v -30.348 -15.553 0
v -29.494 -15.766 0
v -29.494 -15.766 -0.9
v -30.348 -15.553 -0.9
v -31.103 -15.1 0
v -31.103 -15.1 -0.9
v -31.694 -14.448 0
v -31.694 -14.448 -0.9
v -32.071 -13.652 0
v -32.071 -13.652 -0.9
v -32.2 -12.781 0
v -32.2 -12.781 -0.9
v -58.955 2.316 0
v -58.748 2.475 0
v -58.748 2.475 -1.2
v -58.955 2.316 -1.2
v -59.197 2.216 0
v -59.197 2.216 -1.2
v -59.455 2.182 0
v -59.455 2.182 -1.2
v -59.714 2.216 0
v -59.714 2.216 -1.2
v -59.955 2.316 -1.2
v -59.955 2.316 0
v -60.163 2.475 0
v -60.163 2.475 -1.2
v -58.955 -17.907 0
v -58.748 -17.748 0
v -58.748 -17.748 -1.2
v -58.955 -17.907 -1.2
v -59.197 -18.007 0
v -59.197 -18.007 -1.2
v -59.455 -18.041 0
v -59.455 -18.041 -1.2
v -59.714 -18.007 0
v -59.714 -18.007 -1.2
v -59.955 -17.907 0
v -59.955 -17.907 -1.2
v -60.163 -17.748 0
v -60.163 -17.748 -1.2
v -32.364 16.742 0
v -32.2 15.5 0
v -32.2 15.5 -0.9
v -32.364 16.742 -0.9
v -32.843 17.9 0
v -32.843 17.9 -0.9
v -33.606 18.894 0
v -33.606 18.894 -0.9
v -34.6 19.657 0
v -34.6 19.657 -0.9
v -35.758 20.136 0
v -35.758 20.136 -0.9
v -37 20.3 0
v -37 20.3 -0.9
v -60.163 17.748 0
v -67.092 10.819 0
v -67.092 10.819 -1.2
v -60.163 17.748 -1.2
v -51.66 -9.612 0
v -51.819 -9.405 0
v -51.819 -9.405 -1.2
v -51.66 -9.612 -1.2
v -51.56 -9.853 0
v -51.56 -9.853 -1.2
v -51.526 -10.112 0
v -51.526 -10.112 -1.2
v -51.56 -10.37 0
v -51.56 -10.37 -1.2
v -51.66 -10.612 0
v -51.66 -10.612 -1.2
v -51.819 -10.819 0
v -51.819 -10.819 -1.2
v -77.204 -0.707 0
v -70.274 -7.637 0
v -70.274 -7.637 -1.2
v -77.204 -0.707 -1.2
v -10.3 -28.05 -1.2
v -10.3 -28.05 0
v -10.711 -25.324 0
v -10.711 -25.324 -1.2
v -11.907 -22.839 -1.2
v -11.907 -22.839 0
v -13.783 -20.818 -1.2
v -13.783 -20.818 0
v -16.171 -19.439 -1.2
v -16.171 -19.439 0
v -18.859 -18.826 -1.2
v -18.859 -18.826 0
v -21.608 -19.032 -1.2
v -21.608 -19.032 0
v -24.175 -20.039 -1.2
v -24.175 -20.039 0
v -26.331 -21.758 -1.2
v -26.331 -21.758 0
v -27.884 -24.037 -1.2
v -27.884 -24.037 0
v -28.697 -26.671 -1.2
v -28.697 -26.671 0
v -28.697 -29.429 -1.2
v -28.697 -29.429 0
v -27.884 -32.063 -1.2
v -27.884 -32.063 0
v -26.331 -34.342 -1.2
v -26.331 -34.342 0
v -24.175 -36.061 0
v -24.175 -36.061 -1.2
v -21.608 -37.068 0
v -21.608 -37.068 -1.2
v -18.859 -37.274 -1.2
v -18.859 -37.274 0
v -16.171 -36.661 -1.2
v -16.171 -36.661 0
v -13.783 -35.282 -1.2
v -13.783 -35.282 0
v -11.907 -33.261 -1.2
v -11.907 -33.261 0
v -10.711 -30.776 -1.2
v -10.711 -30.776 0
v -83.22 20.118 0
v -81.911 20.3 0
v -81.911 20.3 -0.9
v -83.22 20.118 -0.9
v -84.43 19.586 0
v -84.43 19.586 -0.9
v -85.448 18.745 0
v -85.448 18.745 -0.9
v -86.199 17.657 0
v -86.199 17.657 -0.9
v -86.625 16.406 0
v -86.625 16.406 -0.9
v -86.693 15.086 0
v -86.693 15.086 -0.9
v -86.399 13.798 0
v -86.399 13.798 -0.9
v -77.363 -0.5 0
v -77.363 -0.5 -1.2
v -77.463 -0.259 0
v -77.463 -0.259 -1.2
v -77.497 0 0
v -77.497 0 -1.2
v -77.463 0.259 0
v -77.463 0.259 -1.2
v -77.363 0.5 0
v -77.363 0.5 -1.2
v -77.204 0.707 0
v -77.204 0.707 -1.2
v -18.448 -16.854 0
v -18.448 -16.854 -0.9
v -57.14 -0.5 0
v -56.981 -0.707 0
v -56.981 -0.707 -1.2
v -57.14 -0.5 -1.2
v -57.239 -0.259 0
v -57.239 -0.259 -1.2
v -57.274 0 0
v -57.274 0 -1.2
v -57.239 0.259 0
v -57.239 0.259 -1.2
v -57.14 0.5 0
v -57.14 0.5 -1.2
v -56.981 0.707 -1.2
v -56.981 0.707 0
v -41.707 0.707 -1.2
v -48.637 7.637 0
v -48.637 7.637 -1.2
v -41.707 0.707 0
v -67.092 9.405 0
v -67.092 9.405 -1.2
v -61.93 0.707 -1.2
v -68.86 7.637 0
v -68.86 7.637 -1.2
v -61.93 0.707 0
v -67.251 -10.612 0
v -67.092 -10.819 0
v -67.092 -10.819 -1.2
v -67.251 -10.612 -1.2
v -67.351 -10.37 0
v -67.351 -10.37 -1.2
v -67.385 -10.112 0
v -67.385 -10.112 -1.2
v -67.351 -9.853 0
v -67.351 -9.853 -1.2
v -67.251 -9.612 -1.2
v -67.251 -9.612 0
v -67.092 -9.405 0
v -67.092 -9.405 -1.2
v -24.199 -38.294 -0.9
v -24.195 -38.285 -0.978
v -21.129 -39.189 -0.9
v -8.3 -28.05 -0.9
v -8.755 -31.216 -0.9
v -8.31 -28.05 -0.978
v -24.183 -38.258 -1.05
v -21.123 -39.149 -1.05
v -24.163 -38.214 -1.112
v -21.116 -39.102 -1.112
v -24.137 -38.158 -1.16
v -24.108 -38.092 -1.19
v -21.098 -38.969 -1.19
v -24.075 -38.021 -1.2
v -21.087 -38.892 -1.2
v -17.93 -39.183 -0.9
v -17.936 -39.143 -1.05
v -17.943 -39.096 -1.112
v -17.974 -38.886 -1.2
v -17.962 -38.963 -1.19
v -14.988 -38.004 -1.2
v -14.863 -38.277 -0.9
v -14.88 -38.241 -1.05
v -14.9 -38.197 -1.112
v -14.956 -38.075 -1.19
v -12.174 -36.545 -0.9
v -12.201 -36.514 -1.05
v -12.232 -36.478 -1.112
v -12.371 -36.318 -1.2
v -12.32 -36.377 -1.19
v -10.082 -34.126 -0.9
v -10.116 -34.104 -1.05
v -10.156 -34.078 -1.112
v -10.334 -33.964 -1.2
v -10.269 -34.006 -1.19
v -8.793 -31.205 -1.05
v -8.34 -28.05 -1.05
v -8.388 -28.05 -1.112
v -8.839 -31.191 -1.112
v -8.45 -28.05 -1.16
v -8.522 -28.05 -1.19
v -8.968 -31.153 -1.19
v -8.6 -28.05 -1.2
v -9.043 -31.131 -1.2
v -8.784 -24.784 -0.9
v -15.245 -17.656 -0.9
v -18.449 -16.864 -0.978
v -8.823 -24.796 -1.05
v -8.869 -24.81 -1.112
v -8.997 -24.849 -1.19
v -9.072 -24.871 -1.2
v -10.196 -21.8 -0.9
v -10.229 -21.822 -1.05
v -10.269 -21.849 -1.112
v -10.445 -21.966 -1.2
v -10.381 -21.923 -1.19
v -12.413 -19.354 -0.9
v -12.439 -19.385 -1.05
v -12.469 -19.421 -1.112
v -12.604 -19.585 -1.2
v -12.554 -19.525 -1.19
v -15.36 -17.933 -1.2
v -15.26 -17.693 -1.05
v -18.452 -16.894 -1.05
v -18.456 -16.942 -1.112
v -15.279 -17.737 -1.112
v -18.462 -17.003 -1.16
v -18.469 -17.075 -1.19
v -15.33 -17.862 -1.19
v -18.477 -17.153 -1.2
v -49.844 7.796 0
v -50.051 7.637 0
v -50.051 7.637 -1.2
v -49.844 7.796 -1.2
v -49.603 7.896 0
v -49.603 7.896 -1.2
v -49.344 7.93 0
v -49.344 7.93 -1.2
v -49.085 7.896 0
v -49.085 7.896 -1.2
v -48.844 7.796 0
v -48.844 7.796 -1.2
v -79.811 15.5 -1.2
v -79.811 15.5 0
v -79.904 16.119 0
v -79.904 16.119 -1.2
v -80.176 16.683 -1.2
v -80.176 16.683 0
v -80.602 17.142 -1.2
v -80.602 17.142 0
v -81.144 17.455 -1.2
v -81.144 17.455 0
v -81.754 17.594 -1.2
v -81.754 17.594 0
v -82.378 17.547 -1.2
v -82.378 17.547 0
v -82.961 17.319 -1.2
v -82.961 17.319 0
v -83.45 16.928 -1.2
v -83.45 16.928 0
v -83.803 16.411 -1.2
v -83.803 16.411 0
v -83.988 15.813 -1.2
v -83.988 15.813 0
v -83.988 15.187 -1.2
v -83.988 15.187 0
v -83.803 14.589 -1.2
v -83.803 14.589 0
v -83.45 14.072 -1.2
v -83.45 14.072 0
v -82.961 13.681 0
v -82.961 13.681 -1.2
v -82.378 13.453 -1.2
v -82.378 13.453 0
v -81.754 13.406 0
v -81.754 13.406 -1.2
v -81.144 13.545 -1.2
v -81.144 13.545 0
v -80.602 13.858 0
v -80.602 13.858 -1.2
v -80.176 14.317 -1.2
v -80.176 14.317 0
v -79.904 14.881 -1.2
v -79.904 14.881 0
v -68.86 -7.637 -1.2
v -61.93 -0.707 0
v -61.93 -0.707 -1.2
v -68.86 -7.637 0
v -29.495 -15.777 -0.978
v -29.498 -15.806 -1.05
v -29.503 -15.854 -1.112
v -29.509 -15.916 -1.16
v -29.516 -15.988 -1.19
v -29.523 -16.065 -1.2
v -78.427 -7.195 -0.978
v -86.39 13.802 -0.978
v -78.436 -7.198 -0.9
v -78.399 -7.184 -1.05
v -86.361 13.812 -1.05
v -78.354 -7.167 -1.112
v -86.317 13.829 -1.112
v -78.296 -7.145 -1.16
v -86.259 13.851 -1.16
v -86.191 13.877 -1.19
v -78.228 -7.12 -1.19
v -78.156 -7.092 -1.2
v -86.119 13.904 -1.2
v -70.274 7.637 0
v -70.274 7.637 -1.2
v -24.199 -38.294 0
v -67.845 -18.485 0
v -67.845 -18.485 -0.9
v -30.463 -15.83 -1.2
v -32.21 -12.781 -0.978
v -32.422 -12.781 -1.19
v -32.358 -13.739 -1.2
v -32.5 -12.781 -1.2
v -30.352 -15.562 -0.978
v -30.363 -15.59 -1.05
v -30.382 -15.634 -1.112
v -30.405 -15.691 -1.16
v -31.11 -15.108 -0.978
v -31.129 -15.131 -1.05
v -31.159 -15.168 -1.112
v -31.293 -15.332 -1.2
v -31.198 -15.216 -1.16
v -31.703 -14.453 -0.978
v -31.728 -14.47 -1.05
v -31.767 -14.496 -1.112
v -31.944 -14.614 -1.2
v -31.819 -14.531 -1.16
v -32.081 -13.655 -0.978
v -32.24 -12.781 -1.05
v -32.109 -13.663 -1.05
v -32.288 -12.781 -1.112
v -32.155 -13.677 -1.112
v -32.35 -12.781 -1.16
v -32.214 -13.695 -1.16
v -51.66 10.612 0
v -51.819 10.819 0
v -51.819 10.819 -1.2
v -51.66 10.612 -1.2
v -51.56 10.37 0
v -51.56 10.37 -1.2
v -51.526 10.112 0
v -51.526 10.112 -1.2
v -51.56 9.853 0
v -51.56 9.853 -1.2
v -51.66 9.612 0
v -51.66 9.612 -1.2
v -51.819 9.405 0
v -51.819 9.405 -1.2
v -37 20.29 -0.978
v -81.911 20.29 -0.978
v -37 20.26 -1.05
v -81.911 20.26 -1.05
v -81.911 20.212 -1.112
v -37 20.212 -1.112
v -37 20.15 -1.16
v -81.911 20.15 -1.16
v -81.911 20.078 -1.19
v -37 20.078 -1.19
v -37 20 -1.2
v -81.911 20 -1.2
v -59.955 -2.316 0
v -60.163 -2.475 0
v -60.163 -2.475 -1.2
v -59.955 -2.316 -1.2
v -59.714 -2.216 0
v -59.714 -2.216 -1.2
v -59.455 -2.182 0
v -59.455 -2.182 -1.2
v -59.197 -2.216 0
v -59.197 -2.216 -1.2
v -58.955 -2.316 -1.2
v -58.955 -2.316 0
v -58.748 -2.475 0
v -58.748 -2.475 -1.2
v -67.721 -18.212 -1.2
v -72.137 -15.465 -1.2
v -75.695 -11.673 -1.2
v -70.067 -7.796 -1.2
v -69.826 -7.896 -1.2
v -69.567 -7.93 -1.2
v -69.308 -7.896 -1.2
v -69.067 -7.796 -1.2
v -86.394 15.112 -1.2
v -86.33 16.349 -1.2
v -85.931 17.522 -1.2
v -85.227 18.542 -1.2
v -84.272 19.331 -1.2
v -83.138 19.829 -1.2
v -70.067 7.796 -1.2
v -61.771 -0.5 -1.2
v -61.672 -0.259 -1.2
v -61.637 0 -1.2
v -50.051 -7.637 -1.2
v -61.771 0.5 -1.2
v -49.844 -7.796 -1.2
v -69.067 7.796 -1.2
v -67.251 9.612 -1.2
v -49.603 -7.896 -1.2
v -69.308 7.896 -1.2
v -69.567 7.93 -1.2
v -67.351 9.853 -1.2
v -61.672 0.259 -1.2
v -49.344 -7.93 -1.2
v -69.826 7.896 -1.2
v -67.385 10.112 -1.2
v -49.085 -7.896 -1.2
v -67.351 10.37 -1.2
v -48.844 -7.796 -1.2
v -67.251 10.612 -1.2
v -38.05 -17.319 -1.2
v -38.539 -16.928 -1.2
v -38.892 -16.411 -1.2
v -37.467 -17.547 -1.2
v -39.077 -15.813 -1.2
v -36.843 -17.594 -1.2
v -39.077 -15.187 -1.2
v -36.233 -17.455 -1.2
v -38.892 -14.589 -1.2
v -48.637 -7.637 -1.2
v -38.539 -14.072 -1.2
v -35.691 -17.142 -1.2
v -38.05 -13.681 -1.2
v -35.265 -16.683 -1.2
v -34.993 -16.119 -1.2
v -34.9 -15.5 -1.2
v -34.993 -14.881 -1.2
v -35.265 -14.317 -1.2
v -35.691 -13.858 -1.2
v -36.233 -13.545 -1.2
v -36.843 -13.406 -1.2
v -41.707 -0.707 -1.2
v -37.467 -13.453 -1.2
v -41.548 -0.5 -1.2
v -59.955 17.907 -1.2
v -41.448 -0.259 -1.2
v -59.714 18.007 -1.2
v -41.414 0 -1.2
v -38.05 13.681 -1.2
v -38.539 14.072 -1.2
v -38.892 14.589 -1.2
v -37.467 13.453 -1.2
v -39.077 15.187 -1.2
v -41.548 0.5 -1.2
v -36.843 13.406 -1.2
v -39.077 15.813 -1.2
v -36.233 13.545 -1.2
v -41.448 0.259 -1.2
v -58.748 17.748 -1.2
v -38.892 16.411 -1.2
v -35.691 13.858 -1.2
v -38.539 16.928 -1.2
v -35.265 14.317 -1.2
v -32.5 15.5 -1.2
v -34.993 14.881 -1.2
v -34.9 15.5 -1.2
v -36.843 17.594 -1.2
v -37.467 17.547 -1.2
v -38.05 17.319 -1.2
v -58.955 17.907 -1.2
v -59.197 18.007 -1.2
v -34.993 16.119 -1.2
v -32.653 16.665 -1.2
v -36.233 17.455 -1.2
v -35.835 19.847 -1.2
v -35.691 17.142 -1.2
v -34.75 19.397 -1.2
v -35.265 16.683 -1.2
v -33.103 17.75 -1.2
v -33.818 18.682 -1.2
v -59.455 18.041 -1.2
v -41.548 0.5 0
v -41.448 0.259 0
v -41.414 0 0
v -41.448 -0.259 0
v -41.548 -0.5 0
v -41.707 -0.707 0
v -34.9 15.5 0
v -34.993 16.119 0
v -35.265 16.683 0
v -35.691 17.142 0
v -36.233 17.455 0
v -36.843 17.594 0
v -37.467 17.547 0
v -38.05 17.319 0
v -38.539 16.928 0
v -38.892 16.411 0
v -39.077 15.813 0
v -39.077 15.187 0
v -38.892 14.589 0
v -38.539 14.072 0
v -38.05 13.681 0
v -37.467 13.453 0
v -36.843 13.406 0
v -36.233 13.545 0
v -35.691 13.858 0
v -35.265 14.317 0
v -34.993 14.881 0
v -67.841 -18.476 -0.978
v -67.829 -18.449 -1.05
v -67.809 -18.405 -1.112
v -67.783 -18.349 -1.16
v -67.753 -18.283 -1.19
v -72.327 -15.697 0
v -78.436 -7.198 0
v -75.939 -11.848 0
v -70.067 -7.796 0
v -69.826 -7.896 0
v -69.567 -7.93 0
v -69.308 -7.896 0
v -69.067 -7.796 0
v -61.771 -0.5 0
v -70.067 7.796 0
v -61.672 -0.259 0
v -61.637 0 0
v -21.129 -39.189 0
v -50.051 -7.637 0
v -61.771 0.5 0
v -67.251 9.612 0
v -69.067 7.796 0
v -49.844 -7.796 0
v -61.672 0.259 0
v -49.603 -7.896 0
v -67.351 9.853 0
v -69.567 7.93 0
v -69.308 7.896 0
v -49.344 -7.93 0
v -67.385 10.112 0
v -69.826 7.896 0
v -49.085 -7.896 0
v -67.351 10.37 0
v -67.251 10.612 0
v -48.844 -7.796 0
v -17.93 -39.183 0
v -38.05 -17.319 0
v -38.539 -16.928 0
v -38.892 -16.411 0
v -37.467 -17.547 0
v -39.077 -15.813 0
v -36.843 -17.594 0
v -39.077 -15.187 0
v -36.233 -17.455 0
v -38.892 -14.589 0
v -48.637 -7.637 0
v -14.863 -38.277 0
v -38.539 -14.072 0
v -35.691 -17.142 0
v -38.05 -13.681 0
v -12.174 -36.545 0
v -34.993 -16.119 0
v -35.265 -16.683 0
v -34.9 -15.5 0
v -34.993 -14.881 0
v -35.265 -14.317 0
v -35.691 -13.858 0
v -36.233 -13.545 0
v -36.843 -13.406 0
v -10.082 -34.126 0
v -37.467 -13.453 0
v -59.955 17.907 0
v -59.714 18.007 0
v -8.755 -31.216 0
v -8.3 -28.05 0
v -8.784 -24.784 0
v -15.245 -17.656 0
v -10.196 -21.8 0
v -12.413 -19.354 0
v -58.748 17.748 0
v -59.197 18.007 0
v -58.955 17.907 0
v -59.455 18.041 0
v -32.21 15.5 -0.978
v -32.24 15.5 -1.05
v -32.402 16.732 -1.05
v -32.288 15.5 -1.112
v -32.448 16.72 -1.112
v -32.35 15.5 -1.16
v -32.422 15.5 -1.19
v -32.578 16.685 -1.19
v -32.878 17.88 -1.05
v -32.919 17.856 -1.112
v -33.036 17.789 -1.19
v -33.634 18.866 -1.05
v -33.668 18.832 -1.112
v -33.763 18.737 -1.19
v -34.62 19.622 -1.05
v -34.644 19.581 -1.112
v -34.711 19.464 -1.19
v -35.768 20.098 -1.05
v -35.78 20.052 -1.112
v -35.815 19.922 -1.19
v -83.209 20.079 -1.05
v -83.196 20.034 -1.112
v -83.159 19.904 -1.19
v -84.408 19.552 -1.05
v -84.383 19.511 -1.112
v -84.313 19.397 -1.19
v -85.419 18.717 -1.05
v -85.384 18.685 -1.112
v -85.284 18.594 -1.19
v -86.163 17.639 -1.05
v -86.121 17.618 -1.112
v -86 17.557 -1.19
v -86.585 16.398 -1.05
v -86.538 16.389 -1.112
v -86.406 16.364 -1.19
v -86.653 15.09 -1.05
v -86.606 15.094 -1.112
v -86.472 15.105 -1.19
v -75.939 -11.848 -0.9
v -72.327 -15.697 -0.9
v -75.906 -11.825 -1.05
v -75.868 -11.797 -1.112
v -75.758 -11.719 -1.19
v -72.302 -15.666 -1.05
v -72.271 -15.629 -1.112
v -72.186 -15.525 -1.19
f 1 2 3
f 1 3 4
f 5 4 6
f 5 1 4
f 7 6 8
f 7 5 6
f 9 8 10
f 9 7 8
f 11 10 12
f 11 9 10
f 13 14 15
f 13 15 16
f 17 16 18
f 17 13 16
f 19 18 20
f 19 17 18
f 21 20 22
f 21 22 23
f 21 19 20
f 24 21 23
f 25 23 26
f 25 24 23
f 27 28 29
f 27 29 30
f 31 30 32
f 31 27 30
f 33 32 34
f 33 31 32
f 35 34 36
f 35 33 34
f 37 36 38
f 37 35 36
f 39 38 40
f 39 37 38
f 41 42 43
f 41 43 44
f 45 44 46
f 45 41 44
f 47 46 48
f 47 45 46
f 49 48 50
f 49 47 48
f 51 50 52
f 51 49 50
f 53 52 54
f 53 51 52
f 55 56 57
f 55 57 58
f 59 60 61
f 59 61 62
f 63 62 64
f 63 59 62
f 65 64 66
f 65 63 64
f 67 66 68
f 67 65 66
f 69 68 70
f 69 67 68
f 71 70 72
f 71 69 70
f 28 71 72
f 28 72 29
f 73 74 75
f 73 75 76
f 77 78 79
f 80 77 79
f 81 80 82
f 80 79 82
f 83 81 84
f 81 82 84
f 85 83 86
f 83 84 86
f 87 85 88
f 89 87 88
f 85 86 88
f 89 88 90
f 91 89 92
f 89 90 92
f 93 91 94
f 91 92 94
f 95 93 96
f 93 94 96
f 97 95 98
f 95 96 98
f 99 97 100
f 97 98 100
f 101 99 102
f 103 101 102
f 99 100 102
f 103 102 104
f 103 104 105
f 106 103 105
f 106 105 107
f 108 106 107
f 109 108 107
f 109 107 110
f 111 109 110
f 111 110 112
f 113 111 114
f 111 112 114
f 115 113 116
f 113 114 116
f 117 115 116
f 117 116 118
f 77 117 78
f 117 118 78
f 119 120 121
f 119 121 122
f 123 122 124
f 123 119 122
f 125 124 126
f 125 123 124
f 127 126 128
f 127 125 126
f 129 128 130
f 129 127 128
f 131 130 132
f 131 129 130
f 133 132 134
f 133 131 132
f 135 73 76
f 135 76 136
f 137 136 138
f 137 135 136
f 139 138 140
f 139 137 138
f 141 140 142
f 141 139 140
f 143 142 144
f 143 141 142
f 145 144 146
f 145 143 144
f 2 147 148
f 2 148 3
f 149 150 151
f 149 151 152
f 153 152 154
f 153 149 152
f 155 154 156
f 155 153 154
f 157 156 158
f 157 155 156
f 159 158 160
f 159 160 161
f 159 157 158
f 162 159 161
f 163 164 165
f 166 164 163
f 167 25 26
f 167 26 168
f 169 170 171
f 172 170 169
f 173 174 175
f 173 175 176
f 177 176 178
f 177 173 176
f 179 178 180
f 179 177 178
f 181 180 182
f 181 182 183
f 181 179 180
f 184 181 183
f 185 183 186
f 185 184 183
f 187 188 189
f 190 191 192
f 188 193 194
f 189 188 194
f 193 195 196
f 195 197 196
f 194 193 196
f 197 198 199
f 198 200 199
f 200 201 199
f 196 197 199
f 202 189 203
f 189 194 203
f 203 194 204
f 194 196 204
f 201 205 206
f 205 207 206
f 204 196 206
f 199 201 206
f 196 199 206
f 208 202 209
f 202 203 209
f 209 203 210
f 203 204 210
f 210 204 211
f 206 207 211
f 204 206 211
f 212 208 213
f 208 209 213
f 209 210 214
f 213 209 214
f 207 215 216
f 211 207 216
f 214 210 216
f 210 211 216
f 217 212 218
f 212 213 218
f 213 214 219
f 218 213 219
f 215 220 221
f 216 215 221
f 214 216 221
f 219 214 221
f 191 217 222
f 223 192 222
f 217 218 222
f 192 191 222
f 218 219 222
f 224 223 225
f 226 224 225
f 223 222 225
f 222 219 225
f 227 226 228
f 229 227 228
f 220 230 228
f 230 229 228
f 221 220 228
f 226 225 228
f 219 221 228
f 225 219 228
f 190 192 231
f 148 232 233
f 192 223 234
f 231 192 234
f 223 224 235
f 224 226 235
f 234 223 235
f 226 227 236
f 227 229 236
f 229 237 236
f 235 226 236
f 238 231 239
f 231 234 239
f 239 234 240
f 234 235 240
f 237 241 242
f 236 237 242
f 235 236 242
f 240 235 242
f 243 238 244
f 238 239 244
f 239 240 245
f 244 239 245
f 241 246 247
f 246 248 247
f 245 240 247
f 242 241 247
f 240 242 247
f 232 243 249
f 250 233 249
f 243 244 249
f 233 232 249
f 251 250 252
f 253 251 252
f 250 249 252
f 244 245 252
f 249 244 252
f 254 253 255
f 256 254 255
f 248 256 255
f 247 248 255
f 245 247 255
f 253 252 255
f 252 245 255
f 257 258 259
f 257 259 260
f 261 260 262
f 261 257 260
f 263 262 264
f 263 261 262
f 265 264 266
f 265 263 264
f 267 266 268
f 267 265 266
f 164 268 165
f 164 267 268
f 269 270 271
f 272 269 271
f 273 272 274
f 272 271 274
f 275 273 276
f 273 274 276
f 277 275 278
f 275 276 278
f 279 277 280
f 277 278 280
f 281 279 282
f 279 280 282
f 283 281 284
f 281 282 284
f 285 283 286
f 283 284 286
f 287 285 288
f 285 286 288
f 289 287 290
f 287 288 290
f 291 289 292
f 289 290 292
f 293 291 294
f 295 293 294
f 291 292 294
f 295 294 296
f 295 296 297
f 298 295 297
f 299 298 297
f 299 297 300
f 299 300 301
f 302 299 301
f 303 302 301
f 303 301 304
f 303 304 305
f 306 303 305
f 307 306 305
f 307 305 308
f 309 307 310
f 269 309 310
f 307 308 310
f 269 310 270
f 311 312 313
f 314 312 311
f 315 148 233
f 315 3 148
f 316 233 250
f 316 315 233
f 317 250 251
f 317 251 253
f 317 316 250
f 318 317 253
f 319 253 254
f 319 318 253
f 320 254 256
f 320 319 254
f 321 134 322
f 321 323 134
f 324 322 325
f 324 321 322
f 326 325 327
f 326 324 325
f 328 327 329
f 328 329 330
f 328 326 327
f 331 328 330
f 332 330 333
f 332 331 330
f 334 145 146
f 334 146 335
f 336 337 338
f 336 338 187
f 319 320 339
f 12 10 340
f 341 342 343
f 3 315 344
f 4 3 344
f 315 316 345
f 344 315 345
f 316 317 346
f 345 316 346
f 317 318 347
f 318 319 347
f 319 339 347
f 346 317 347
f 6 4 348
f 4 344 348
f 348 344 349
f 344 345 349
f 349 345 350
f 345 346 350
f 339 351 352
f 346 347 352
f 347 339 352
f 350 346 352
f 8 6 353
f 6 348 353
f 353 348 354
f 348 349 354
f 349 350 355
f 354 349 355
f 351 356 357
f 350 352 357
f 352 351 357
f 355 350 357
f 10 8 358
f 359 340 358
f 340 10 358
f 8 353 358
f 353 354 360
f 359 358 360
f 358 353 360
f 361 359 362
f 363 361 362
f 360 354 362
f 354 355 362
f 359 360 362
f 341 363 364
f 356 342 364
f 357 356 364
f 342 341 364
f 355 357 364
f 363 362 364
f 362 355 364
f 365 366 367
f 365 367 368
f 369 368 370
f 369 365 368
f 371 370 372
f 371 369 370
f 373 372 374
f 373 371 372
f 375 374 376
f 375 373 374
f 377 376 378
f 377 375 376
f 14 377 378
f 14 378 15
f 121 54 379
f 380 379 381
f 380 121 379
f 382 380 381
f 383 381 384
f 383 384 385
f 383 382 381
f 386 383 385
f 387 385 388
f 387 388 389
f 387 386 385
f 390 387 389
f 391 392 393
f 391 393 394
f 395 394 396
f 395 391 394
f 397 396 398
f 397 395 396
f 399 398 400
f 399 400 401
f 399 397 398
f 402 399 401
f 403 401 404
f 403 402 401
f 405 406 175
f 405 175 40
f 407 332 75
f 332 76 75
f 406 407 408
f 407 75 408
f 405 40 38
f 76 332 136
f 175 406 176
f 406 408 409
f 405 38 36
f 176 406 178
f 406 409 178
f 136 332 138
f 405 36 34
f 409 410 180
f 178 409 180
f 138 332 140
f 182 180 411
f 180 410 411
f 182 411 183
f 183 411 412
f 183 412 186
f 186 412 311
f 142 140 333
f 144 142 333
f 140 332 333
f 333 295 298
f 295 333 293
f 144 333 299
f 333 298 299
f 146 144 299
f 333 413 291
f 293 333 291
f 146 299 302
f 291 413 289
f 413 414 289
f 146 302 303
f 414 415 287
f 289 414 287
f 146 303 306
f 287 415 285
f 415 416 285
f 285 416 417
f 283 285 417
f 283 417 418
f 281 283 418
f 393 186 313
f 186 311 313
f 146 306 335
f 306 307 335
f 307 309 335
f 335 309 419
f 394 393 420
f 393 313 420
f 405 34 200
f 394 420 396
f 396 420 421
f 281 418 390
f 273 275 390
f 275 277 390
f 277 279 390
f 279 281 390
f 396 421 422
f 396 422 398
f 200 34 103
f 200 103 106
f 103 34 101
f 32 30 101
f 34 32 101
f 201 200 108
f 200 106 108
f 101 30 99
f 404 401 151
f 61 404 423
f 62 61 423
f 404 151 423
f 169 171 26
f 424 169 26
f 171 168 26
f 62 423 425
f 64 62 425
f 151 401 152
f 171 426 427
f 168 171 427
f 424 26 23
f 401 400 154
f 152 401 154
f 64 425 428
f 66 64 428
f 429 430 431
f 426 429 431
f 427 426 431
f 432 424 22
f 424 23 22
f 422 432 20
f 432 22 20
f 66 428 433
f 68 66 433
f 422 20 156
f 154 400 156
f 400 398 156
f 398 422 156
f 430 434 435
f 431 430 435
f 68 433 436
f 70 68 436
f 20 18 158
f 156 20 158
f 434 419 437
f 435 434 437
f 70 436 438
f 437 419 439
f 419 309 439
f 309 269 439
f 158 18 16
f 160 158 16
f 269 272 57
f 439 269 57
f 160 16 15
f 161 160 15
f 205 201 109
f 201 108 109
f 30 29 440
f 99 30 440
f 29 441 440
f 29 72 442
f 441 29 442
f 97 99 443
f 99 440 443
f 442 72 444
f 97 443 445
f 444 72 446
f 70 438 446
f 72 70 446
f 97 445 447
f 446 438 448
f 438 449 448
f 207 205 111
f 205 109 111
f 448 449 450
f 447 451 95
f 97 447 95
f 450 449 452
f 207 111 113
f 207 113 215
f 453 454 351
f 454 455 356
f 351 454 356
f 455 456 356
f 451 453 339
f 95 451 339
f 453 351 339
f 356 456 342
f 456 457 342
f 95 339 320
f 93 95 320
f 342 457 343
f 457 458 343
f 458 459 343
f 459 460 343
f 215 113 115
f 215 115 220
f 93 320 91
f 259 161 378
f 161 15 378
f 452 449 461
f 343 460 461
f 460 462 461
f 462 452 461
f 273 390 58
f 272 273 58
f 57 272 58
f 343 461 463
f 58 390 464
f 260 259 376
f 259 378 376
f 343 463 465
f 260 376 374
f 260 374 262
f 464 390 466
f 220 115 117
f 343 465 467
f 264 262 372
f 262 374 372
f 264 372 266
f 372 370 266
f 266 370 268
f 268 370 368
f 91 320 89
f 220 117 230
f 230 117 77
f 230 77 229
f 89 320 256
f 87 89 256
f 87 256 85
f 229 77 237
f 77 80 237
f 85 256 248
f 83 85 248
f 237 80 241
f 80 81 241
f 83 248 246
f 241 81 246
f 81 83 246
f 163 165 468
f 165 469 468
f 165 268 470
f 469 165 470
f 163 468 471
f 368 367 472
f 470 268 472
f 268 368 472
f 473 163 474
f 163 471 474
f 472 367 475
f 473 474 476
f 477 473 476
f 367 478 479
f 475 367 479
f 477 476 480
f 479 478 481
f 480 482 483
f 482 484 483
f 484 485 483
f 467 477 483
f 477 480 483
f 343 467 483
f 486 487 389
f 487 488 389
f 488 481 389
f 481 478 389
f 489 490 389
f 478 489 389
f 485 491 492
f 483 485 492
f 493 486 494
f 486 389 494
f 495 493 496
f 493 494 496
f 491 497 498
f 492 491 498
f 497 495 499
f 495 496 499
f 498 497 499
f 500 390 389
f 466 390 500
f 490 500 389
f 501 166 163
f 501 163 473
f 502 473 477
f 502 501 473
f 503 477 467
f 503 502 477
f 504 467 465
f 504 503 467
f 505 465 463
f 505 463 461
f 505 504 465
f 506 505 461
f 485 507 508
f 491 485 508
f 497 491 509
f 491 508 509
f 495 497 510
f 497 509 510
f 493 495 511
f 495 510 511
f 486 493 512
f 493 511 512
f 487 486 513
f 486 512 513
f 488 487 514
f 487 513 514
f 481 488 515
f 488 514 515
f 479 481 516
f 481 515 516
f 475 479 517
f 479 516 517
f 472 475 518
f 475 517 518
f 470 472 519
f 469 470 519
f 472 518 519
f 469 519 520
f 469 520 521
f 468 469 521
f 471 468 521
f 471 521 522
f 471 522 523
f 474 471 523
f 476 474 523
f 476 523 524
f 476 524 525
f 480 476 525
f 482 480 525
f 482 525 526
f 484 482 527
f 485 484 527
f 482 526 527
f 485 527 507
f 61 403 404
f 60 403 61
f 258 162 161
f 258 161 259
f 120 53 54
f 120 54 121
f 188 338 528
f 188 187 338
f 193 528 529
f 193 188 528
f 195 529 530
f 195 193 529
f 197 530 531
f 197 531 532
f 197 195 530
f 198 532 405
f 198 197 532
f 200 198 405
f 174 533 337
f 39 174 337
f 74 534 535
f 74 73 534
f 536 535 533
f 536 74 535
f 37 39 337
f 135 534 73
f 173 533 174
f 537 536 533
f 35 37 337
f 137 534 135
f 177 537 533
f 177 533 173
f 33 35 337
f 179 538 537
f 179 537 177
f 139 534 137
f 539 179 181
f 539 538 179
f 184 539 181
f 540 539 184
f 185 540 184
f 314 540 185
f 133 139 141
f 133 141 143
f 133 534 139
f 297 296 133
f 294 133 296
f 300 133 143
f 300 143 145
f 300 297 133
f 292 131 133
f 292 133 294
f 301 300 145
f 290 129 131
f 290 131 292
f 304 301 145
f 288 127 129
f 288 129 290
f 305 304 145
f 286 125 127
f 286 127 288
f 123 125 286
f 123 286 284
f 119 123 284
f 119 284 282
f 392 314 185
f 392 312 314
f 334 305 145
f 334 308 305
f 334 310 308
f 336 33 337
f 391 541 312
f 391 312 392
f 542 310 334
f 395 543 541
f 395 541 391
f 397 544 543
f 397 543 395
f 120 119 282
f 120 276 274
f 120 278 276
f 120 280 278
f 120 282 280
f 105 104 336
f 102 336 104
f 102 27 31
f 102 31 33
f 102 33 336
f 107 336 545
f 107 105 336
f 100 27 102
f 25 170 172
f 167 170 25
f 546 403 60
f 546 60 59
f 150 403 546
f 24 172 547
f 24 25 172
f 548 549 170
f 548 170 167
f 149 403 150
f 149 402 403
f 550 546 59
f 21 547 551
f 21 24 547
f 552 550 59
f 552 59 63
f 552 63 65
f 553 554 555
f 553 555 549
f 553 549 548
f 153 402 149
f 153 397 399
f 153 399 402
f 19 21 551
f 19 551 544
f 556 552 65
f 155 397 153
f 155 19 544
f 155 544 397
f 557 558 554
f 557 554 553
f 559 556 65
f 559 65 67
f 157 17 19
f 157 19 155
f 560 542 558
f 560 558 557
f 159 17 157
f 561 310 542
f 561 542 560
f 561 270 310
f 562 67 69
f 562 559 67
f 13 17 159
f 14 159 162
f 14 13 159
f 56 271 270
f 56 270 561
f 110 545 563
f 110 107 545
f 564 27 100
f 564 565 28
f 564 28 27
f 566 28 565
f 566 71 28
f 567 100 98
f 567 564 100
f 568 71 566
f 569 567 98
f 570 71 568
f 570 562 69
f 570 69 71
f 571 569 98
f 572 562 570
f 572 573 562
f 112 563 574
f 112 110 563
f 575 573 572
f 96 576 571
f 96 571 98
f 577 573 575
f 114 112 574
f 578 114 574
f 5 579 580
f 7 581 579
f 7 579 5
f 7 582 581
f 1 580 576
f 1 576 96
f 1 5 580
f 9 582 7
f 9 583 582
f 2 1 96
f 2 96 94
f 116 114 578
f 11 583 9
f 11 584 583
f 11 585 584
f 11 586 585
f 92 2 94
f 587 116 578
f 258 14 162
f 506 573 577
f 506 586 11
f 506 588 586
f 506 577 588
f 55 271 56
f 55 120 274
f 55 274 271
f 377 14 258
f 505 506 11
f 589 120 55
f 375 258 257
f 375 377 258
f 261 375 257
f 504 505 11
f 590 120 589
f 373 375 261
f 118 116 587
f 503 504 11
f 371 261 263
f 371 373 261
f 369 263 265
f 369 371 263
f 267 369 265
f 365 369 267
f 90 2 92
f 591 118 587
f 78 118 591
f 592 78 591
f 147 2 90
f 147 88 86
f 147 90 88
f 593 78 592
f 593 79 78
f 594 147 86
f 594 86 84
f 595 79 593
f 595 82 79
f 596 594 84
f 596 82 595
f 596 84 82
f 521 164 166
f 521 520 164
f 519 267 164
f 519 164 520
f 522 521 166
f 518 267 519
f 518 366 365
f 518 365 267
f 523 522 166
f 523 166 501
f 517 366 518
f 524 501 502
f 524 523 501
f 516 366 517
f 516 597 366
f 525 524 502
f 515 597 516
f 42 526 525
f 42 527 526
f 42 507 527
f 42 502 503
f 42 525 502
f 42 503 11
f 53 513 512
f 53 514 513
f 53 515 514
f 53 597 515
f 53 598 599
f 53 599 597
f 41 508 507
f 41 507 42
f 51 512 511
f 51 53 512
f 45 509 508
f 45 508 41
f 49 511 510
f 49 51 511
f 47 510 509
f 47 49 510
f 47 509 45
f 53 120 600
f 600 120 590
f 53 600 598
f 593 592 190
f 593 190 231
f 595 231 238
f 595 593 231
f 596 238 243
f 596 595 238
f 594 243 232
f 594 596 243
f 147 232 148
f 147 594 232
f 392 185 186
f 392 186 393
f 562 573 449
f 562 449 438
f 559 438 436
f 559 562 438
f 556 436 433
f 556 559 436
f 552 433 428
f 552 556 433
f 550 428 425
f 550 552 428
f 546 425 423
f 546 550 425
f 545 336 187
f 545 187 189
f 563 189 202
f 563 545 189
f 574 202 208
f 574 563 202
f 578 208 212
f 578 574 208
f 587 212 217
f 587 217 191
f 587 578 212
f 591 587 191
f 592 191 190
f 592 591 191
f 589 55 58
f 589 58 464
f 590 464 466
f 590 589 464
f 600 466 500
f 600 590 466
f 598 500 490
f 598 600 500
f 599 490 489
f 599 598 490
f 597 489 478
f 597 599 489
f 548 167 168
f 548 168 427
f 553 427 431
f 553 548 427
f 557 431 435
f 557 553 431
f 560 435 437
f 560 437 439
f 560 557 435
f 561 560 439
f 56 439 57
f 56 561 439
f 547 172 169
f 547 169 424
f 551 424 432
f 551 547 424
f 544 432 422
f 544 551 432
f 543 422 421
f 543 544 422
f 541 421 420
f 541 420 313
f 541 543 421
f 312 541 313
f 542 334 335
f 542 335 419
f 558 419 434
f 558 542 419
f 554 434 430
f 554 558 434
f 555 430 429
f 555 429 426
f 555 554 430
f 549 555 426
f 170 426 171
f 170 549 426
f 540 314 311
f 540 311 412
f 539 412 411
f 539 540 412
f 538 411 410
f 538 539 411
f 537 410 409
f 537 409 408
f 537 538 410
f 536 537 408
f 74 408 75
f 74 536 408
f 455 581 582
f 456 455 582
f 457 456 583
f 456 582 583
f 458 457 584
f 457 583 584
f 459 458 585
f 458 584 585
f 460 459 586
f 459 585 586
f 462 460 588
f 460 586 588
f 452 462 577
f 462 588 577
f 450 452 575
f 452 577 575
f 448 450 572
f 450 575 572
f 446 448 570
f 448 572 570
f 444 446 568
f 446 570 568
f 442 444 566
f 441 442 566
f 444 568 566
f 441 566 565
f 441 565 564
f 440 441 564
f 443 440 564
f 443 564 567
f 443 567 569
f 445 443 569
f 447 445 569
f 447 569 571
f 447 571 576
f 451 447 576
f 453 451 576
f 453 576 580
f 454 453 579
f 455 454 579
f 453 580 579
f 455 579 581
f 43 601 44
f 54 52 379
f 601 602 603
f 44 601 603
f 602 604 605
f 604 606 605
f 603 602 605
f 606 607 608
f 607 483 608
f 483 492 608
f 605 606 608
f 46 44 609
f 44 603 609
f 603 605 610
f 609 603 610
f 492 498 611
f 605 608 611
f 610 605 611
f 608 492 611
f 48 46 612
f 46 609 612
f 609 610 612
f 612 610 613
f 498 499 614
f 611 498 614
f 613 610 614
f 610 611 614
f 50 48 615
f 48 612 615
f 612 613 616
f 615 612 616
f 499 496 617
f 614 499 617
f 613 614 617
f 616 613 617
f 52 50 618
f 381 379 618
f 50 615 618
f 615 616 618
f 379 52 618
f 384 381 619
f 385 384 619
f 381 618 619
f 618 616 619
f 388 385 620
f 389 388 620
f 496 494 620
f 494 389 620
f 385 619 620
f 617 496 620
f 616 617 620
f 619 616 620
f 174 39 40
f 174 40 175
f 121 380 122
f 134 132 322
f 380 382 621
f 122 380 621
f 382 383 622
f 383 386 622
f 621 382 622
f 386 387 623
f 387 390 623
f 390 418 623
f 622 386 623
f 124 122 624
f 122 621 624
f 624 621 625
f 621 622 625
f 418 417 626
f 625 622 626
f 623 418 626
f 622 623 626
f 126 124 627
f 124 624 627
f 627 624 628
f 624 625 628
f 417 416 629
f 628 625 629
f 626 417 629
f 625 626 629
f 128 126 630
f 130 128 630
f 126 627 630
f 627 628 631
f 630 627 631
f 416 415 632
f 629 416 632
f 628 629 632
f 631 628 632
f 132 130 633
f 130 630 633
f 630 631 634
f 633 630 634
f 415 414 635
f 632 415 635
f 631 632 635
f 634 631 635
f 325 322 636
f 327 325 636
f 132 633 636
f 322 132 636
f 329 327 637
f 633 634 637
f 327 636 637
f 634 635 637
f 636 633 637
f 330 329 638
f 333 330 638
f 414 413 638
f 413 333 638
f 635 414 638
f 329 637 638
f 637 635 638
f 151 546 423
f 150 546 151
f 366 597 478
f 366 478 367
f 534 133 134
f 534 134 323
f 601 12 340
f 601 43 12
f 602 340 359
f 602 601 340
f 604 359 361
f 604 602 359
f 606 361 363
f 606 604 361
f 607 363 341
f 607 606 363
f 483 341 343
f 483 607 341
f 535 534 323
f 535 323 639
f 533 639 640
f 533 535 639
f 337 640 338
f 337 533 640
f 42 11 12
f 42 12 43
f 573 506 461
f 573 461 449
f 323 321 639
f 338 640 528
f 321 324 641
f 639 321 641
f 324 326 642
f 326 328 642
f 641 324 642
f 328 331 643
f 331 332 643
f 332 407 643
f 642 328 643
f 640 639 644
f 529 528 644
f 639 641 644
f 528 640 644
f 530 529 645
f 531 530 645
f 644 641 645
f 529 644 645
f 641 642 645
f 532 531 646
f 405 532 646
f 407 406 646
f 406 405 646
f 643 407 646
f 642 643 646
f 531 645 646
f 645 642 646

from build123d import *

# Parameters (mm, degrees)
F0_R     = 2.1
F0_R_2   = 9.25
F1_DEPTH = 1.2
F2_R     = 0.3


with BuildPart() as f1:
    # F0 (on Top) → F1 (new body)
    with BuildSketch(Plane.XY):
        with BuildLine():
            ThreePointArc((-77.110974, 15.5), (-78.516861, 18.894113), (-81.910974, 20.3))
            ThreePointArc((-81.910974, 20.3), (-85.861289, 18.226722), (-86.399062, 13.797923))
            ThreePointArc((-86.399062, 13.797923), (-81.045764, 10.778622), (-77.110974, 15.5))
        make_face()
        with Locations((-81.910974, 15.5)):
            Circle(F0_R, mode=Mode.SUBTRACT)
        with BuildLine():
            ThreePointArc((-78.436359, -7.198369), (-76.162026, 11.531763), (-59.455487, 20.3))
            Line((-59.455487, 20.3), (-81.910974, 20.3))
            ThreePointArc((-81.910974, 20.3), (-78.516861, 18.894113), (-77.110974, 15.5))
            ThreePointArc((-77.110974, 15.5), (-81.045764, 10.778622), (-86.399062, 13.797923))
            Line((-86.399062, 13.797923), (-78.436359, -7.198369))
        make_face()
        with BuildLine():
            ThreePointArc((-59.455487, -19), (-46.020458, -13.435029), (-40.455487, 0))
            ThreePointArc((-40.455487, 0), (-46.020458, 13.435029), (-59.455487, 19))
            ThreePointArc((-59.455487, 19), (-78.455487, 0), (-59.455487, -19))
        make_face()
        with BuildLine():
            ThreePointArc((-58.74838, -17.74838), (-59.455487, -18.041273), (-60.162594, -17.74838))
            Line((-60.162594, -17.74838), (-67.09224, -10.818734))
            ThreePointArc((-67.09224, -10.818734), (-67.385133, -10.111627), (-67.09224, -9.40452))
            Line((-67.09224, -9.40452), (-60.162594, -2.474874))
            ThreePointArc((-60.162594, -2.474874), (-59.455487, -2.181981), (-58.74838, -2.474874))
            Line((-58.74838, -2.474874), (-51.818734, -9.40452))
            ThreePointArc((-51.818734, -9.40452), (-51.525841, -10.111627), (-51.818734, -10.818734))
            Line((-51.818734, -10.818734), (-58.74838, -17.74838))
        make_face(mode=Mode.SUBTRACT)
        with BuildLine():
            ThreePointArc((-70.274221, 7.636753), (-69.567114, 7.929646), (-68.860007, 7.636753))
            Line((-68.860007, 7.636753), (-61.930361, 0.707107))
            ThreePointArc((-61.930361, 0.707107), (-61.637468, 0), (-61.930361, -0.707107))
            Line((-61.930361, -0.707107), (-68.860007, -7.636753))
            ThreePointArc((-68.860007, -7.636753), (-69.567114, -7.929646), (-70.274221, -7.636753))
            Line((-70.274221, -7.636753), (-77.203867, -0.707107))
            ThreePointArc((-77.203867, -0.707107), (-77.49676, 0), (-77.203867, 0.707107))
            Line((-77.203867, 0.707107), (-70.274221, 7.636753))
        make_face(mode=Mode.SUBTRACT)
        with BuildLine():
            Line((-48.636753, 7.636753), (-41.707107, 0.707107))
            ThreePointArc((-41.707107, 0.707107), (-41.414214, 0), (-41.707107, -0.707107))
            Line((-41.707107, -0.707107), (-48.636753, -7.636753))
            ThreePointArc((-48.636753, -7.636753), (-49.34386, -7.929646), (-50.050967, -7.636753))
            Line((-50.050967, -7.636753), (-56.980613, -0.707107))
            ThreePointArc((-56.980613, -0.707107), (-57.273506, 0), (-56.980613, 0.707107))
            Line((-56.980613, 0.707107), (-50.050967, 7.636753))
            ThreePointArc((-50.050967, 7.636753), (-49.34386, 7.929646), (-48.636753, 7.636753))
        make_face(mode=Mode.SUBTRACT)
        with BuildLine():
            ThreePointArc((-51.818734, 10.818734), (-51.525841, 10.111627), (-51.818734, 9.40452))
            Line((-51.818734, 9.40452), (-58.74838, 2.474874))
            ThreePointArc((-58.74838, 2.474874), (-59.455487, 2.181981), (-60.162594, 2.474874))
            Line((-60.162594, 2.474874), (-67.09224, 9.40452))
            ThreePointArc((-67.09224, 9.40452), (-67.385133, 10.111627), (-67.09224, 10.818734))
            Line((-67.09224, 10.818734), (-60.162594, 17.74838))
            ThreePointArc((-60.162594, 17.74838), (-59.455487, 18.041273), (-58.74838, 17.74838))
            Line((-58.74838, 17.74838), (-51.818734, 10.818734))
        make_face(mode=Mode.SUBTRACT)
        with BuildLine():
            Line((-40.284814, 19), (-52.30776, 19))
            ThreePointArc((-52.30776, 19), (-42.764339, 11.554028), (-39.155487, 0))
            ThreePointArc((-39.155487, 0), (-42.764339, -11.554028), (-52.30776, -19))
            Line((-52.30776, -19), (-40.284814, -19))
            ThreePointArc((-40.284814, -19), (-40.394113, -12.105887), (-33.5, -12.215186))
            Line((-33.5, -12.215186), (-33.5, 0))
            Line((-33.5, 0), (-33.5, 12.215186))
            ThreePointArc((-33.5, 12.215186), (-40.394113, 12.105887), (-40.284814, 19))
        make_face()
        with BuildLine():
            ThreePointArc((-59.455487, 19), (-46.020458, 13.435029), (-40.455487, 0))
            ThreePointArc((-40.455487, 0), (-46.020458, -13.435029), (-59.455487, -19))
            Line((-59.455487, -19), (-52.30776, -19))
            ThreePointArc((-52.30776, -19), (-42.764339, -11.554028), (-39.155487, 0))
            ThreePointArc((-39.155487, 0), (-42.764339, 11.554028), (-52.30776, 19))
            Line((-52.30776, 19), (-59.455487, 19))
        make_face()
        with BuildLine():
            ThreePointArc((-59.455487, -19), (-78.455487, 0), (-59.455487, 19))
            Line((-59.455487, 19), (-52.30776, 19))
            ThreePointArc((-52.30776, 19), (-55.822995, 19.972356), (-59.455487, 20.3))
            ThreePointArc((-59.455487, 20.3), (-76.162026, 11.531763), (-78.436359, -7.198369))
            ThreePointArc((-78.436359, -7.198369), (-74.258704, -13.890816), (-67.845188, -18.485208))
            ThreePointArc((-67.845188, -18.485208), (-63.747356, -19.841115), (-59.455487, -20.3))
            ThreePointArc((-59.455487, -20.3), (-55.822995, -19.972356), (-52.30776, -19))
            Line((-52.30776, -19), (-59.455487, -19))
        make_face()
        with BuildLine():
            ThreePointArc((-59.455487, 20.3), (-55.822995, 19.972356), (-52.30776, 19))
            Line((-52.30776, 19), (-40.284814, 19))
            ThreePointArc((-40.284814, 19), (-38.766352, 19.963183), (-37, 20.3))
            Line((-37, 20.3), (-59.455487, 20.3))
        make_face()
        with BuildLine():
            ThreePointArc((-37, 20.3), (-38.766352, 19.963183), (-40.284814, 19))
            ThreePointArc((-40.284814, 19), (-40.394113, 12.105887), (-33.5, 12.215186))
            ThreePointArc((-33.5, 12.215186), (-32.536817, 13.733648), (-32.2, 15.5))
            ThreePointArc((-32.2, 15.5), (-33.605887, 18.894113), (-37, 20.3))
        make_face()
        with Locations((-37, 15.5)):
            Circle(F0_R, mode=Mode.SUBTRACT)
        with BuildLine():
            ThreePointArc((-32.2, 15.5), (-32.536817, 13.733648), (-33.5, 12.215186))
            Line((-33.5, 12.215186), (-33.5, 0))
            Line((-33.5, 0), (-32.2, 0))
            Line((-32.2, 0), (-32.2, 4.854651))
            Line((-32.2, 4.854651), (-32.2, 15.5))
        make_face()
        with BuildLine():
            ThreePointArc((-33.5, -12.215186), (-40.394113, -12.105887), (-40.284814, -19))
            ThreePointArc((-40.284814, -19), (-38.766352, -19.963183), (-37, -20.3))
            ThreePointArc((-37, -20.3), (-33.605887, -18.894113), (-32.2, -15.5))
            ThreePointArc((-32.2, -15.5), (-32.536817, -13.733648), (-33.5, -12.215186))
        make_face()
        with Locations((-37, -15.5)):
            Circle(F0_R, mode=Mode.SUBTRACT)
        with BuildLine():
            Line((-40.284814, -19), (-52.30776, -19))
            ThreePointArc((-52.30776, -19), (-55.822995, -19.972356), (-59.455487, -20.3))
            Line((-59.455487, -20.3), (-37, -20.3))
            ThreePointArc((-37, -20.3), (-38.766352, -19.963183), (-40.284814, -19))
        make_face()
        with BuildLine():
            Line((-37, -20.3), (-59.455487, -20.3))
            ThreePointArc((-59.455487, -20.3), (-63.747356, -19.841115), (-67.845188, -18.485208))
            Line((-67.845188, -18.485208), (-24.199465, -38.294266))
            ThreePointArc((-24.199465, -38.294266), (-30.415777, -25.13497), (-18.44759, -16.854144))
            Line((-18.44759, -16.854144), (-29.493976, -15.766451))
            ThreePointArc((-29.493976, -15.766451), (-31.422828, -14.795594), (-32.2, -12.78089))
            Line((-32.2, -12.78089), (-32.2, 0))
            Line((-32.2, 0), (-33.5, 0))
            Line((-33.5, 0), (-33.5, -12.215186))
            ThreePointArc((-33.5, -12.215186), (-32.536817, -13.733648), (-32.2, -15.5))
            ThreePointArc((-32.2, -15.5), (-33.605887, -18.894113), (-37, -20.3))
        make_face()
        with BuildLine():
            ThreePointArc((-18.44759, -16.854144), (-30.415777, -25.13497), (-24.199465, -38.294266))
            ThreePointArc((-24.199465, -38.294266), (-13.456724, -37.506981), (-8.3, -28.05))
            ThreePointArc((-8.3, -28.05), (-11.214395, -20.494857), (-18.44759, -16.854144))
        make_face()
        with Locations((-19.55, -28.05)):
            Circle(F0_R_2, mode=Mode.SUBTRACT)
    extrude(amount=-F1_DEPTH)

    # F2
    f2_edges = [f1.edges().sort_by_distance(p)[0] for p in [
        (-46.022326, -28.389737, -1.2),
        (-74.258704, -13.890816, -1.2),
        (-82.41771, 3.299777, -1.2),
        (-85.861289, 18.226722, -1.2),
        (-59.455487, 20.3, -1.2),
        (-33.605887, 18.894113, -1.2),
        (-32.2, 1.359555, -1.2),
        (-31.422828, -14.795594, -1.2),
        (-23.970783, -16.310298, -1.2),
        (-8.684223, -30.96503, -1.2),
    ]]
    fillet(f2_edges, radius=F2_R)


solid = f1.part
